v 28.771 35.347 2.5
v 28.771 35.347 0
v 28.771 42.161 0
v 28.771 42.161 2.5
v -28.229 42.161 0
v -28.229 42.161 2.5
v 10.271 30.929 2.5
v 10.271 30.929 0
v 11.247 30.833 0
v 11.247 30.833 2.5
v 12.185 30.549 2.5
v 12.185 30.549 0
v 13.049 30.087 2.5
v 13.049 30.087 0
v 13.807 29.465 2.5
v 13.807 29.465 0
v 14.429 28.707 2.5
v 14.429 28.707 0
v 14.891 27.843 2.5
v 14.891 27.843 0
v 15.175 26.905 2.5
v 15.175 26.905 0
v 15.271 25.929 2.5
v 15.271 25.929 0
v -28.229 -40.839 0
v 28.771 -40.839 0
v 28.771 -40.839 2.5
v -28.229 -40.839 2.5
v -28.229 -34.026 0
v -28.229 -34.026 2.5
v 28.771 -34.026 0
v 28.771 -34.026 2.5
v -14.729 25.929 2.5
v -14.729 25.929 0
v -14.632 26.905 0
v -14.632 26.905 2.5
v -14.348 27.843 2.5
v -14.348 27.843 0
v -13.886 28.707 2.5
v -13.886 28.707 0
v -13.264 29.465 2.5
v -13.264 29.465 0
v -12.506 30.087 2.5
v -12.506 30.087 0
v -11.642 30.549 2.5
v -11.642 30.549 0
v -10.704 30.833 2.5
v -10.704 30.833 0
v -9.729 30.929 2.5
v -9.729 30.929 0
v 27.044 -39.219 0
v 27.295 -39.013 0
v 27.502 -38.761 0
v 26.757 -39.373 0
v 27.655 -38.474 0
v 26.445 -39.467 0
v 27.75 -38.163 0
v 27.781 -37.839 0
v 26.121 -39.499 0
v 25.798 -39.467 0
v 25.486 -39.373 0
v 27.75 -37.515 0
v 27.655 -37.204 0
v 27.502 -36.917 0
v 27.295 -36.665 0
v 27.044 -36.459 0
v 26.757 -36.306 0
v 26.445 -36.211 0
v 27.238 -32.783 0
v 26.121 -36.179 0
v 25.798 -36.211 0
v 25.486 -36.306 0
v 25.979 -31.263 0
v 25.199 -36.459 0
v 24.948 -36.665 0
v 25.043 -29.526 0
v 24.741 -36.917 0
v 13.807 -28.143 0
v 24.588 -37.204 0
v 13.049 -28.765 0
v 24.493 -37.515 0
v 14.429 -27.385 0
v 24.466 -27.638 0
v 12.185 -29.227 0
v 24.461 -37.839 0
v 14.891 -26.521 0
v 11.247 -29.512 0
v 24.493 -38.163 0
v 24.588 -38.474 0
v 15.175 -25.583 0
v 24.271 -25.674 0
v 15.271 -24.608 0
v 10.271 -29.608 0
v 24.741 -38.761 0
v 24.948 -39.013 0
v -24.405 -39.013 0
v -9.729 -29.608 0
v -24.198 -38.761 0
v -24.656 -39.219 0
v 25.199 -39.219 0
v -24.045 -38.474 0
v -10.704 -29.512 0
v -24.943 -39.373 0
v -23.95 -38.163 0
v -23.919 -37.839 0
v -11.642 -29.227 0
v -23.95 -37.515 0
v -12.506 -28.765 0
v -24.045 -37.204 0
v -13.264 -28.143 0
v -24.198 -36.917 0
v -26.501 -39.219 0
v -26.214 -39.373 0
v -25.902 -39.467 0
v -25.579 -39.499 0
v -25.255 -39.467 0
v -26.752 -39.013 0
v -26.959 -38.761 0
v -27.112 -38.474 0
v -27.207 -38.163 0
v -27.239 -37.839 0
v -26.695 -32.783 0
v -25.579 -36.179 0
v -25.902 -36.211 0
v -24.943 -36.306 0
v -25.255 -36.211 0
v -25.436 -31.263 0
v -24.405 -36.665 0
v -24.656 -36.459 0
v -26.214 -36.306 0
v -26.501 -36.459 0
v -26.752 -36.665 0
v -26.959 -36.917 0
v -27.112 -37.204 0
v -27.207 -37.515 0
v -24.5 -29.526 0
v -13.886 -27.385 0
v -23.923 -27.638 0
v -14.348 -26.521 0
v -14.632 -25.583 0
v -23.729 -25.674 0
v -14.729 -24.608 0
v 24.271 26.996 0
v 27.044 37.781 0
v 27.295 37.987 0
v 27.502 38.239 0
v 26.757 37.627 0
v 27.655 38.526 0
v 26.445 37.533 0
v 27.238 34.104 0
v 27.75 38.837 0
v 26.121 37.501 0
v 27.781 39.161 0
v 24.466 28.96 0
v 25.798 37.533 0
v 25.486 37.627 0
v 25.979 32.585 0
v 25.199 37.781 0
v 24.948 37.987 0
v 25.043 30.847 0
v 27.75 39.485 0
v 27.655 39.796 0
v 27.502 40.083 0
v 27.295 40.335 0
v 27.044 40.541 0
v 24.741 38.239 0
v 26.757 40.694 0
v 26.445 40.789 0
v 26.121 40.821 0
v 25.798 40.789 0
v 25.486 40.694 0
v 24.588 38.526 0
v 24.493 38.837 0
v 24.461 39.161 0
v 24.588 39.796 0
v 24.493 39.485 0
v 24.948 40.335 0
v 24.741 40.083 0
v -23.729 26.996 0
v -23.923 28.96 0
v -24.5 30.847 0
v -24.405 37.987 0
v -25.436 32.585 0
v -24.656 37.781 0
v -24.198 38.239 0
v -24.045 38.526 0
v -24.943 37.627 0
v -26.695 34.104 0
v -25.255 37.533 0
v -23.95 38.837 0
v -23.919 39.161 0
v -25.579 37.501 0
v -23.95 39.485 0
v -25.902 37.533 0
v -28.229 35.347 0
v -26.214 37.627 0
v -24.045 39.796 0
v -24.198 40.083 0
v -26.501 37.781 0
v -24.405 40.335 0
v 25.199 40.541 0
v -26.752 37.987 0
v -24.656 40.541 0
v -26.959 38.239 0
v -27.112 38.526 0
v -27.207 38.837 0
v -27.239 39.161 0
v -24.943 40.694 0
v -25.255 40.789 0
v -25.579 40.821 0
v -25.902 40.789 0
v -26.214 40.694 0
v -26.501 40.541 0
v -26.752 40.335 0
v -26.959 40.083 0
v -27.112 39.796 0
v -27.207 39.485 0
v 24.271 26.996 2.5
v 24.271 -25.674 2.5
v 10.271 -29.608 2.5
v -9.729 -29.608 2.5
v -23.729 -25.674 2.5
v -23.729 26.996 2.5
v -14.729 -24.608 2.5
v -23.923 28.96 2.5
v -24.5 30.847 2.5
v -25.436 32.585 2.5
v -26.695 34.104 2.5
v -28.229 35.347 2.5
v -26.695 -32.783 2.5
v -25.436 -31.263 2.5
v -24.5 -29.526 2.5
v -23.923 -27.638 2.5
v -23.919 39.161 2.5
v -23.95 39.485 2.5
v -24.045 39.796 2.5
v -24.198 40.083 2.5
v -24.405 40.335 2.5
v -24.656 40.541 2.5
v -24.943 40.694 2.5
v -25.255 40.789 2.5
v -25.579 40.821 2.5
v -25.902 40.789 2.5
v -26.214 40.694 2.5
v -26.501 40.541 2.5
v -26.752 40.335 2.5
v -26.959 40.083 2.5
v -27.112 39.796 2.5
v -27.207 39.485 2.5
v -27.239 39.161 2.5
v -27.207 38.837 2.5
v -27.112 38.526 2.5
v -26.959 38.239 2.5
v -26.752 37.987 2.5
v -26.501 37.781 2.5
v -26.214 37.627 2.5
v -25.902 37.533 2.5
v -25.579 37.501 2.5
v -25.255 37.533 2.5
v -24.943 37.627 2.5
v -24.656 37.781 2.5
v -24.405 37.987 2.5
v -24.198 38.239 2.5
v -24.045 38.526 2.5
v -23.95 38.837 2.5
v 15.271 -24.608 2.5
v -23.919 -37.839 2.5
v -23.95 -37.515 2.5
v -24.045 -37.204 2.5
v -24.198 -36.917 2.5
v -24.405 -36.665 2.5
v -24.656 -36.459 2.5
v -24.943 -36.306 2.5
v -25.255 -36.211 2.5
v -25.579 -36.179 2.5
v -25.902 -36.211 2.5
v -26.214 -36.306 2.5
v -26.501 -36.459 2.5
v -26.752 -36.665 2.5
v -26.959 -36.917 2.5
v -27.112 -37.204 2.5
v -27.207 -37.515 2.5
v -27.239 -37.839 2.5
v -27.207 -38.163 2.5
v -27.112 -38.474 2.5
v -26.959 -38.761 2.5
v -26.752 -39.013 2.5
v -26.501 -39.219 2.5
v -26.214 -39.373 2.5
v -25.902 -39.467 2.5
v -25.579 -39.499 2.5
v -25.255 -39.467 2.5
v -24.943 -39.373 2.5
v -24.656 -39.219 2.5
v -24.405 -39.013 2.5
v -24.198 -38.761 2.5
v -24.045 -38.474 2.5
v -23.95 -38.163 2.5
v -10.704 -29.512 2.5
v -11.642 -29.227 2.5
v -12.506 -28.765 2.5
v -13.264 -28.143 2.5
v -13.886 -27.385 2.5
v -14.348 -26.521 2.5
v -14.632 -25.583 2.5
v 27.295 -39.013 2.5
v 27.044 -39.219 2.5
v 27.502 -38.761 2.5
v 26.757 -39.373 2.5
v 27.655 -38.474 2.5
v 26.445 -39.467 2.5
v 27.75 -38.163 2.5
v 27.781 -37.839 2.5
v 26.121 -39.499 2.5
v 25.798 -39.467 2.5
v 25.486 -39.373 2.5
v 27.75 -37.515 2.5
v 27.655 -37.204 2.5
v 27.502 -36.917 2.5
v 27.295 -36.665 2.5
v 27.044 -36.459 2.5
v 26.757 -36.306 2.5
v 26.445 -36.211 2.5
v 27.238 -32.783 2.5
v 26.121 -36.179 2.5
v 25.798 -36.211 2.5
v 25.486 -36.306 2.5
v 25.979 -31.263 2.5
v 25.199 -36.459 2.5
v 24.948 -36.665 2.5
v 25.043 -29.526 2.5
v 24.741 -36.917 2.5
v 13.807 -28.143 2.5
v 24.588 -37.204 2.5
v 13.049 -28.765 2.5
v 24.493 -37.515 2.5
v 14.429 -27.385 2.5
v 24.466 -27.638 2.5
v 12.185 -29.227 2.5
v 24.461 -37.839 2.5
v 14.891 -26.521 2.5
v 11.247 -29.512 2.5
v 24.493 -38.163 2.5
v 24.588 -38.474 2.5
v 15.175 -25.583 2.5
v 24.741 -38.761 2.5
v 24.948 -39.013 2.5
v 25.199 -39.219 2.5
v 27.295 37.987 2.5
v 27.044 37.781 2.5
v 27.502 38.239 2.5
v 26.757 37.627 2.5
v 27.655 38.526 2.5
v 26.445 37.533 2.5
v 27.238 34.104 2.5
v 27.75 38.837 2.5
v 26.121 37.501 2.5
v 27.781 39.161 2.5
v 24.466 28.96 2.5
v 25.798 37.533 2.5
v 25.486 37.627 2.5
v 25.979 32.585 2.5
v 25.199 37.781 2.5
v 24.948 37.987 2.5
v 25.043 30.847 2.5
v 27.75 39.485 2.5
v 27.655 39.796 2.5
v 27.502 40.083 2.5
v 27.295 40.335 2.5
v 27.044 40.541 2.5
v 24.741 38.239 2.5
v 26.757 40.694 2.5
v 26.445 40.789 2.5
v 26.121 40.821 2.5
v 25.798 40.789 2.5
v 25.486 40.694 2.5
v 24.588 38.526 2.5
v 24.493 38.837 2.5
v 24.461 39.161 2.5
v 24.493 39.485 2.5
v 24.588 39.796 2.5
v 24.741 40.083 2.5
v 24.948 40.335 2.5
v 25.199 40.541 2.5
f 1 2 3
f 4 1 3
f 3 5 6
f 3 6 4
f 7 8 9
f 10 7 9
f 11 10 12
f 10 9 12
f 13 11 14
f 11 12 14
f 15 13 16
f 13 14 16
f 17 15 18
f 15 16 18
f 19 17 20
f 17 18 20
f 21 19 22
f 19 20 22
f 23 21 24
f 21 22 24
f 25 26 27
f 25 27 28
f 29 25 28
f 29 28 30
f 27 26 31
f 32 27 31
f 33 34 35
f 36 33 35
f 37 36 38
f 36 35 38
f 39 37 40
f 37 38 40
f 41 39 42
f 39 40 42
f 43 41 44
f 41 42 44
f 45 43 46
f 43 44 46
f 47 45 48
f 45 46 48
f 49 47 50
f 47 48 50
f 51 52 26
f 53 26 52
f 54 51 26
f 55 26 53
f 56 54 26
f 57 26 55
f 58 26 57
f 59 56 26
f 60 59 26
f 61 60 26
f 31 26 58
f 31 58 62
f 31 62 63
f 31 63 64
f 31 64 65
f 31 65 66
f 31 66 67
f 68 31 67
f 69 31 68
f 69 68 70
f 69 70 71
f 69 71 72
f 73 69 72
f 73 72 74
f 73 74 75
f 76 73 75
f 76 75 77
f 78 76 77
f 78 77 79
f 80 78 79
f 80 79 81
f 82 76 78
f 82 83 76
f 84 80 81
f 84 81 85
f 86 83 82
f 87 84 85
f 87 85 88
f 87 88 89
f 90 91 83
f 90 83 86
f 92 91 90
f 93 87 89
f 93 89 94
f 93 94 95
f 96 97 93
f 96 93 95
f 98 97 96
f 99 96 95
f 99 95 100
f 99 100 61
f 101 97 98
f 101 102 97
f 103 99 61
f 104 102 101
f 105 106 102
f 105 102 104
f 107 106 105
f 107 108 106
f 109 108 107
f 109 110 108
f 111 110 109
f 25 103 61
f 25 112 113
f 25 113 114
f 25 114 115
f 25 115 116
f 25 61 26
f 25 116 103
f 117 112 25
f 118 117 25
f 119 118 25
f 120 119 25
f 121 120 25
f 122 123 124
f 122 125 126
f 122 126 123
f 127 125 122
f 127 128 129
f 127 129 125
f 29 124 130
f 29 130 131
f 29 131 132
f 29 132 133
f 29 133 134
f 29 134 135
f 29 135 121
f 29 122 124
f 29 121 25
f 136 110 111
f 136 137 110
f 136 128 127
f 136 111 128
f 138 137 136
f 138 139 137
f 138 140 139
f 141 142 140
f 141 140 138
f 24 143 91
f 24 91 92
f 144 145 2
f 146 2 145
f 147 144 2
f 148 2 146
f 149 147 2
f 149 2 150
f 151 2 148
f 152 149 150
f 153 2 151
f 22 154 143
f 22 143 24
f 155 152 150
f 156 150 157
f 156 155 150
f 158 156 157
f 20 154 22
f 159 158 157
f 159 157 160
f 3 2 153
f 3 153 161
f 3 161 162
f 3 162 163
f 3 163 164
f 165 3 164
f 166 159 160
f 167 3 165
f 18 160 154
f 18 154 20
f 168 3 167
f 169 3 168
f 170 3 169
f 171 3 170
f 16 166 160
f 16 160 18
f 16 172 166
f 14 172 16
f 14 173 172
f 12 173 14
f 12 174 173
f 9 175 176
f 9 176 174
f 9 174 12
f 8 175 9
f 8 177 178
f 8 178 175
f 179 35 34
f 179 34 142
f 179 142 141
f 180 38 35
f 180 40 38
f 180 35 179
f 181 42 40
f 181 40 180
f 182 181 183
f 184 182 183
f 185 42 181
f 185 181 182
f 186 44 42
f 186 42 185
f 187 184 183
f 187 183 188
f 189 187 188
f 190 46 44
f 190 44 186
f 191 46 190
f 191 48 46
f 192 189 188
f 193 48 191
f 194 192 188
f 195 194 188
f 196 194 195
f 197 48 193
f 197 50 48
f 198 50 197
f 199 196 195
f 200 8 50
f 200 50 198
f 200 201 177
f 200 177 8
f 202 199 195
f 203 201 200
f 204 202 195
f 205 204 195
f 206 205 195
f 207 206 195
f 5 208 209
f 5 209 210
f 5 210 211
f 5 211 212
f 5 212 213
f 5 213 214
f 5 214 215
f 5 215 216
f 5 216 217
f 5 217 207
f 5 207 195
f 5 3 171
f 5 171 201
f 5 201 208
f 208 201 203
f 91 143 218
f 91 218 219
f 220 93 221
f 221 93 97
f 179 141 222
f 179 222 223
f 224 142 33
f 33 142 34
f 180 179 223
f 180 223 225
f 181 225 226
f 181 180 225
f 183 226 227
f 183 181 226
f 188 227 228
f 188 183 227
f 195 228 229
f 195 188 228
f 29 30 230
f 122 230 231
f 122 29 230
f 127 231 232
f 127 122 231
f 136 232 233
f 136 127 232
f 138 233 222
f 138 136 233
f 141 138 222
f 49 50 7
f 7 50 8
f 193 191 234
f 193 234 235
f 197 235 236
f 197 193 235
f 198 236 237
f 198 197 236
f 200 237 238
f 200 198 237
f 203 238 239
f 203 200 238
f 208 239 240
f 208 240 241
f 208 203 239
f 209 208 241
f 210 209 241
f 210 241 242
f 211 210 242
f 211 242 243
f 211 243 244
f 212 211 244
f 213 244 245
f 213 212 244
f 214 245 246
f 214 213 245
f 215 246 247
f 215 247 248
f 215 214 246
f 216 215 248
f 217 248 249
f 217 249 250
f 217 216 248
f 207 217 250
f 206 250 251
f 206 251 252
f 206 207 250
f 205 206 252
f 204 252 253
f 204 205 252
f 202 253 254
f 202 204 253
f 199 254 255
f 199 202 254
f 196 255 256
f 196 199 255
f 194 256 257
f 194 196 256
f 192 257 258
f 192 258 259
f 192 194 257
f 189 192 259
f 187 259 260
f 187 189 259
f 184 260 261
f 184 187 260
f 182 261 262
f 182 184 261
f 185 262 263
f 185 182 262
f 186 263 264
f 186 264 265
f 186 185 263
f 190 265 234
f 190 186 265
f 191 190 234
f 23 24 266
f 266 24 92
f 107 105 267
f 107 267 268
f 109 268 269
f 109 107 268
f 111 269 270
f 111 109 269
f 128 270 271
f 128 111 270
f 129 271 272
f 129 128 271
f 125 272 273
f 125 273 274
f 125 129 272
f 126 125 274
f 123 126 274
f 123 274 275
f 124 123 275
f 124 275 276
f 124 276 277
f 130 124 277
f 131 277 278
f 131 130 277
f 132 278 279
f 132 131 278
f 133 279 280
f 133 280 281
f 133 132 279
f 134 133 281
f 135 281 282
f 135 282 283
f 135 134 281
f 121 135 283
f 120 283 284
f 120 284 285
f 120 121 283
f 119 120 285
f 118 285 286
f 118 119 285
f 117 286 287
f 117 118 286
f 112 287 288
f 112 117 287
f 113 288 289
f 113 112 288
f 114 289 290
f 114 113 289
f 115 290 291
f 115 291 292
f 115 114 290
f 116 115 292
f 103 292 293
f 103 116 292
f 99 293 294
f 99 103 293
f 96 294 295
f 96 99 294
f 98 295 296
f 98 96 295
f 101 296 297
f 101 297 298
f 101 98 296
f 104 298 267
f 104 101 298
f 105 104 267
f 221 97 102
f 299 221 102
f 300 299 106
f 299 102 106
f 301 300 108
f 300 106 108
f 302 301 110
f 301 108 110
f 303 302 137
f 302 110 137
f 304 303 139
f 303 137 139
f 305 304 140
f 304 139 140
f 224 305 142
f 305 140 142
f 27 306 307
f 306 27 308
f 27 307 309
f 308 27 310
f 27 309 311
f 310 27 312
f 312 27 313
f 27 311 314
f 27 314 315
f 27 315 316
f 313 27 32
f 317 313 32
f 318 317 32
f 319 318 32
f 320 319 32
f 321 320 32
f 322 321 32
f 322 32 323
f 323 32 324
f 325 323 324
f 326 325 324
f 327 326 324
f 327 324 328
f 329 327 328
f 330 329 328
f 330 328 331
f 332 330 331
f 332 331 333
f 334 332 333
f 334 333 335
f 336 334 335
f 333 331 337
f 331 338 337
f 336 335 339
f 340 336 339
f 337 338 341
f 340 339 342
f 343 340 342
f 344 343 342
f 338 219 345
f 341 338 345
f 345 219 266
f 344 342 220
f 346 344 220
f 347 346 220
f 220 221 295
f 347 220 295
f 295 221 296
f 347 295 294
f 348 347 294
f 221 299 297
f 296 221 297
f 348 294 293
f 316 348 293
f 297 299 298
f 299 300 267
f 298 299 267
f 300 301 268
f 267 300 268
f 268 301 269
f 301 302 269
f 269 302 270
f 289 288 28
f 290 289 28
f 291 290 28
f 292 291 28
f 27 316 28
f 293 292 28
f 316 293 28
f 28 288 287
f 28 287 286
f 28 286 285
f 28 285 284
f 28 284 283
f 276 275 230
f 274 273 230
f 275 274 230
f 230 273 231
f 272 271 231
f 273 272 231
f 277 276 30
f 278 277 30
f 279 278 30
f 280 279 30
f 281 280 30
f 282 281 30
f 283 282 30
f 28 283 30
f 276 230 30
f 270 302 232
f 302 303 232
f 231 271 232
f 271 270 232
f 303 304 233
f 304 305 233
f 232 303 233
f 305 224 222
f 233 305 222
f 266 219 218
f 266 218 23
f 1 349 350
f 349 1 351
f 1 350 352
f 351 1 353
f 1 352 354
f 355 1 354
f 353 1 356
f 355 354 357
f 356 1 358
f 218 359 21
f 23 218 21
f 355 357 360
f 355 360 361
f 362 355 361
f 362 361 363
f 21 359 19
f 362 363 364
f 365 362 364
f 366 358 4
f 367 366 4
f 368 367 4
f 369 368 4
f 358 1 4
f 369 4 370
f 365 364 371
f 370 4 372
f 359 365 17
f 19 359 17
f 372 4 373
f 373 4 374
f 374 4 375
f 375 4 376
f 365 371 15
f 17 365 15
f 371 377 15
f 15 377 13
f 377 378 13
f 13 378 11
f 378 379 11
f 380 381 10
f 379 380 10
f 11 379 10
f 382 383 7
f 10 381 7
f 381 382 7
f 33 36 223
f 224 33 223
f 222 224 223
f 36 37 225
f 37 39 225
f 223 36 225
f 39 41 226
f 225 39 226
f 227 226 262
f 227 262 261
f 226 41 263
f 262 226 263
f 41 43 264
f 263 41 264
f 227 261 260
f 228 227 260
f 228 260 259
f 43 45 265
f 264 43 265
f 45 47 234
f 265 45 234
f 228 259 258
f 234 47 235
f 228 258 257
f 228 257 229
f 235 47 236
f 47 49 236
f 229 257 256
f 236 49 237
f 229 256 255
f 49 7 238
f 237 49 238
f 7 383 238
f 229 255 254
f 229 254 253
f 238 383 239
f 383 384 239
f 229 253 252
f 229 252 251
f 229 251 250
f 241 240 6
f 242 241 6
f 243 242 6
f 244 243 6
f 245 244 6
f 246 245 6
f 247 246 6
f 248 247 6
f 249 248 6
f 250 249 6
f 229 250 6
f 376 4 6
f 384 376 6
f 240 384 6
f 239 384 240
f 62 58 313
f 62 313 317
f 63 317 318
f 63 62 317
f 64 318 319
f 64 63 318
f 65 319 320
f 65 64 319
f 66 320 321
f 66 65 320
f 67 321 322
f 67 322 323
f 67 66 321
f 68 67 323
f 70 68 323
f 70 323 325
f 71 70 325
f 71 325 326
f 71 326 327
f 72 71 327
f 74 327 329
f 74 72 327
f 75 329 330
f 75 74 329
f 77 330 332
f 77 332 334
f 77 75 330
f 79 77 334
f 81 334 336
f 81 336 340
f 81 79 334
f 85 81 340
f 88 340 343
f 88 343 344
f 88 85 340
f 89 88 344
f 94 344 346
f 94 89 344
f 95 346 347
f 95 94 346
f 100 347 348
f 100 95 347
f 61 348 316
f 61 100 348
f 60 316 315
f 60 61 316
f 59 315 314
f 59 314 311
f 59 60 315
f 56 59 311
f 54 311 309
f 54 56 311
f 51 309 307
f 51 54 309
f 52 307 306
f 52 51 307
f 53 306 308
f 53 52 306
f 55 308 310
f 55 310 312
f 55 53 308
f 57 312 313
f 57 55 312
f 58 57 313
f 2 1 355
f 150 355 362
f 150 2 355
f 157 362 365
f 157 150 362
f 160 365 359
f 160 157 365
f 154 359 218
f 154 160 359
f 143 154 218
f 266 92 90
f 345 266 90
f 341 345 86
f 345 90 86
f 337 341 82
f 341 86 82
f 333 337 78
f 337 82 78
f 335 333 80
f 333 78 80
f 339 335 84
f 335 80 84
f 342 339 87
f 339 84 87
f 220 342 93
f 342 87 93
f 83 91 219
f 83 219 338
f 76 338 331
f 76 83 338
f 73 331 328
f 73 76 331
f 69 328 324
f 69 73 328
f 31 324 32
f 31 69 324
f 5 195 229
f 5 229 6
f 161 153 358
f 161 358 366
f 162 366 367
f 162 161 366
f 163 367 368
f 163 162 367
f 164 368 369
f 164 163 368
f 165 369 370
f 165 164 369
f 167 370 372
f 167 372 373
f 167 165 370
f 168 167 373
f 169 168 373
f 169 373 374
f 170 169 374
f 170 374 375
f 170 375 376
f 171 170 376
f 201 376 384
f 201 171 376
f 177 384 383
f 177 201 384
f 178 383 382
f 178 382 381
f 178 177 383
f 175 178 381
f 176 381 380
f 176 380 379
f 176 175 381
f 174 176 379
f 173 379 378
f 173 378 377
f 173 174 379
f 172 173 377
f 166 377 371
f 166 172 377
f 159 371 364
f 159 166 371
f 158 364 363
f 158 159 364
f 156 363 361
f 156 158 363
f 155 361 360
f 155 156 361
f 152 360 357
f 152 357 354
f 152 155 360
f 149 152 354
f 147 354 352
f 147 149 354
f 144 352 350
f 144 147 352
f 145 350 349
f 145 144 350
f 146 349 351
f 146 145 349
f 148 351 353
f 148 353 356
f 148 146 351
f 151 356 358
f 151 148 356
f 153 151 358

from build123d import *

# Parameters (mm, degrees)
ESQUISSE1_R             = 1.66
BOSS_EXTRU_1_DEPTH      = 2.5
ESQUISSE2_W             = 13.135596865
ESQUISSE2_H             = 97.305440857
ENL_V_MAT_EXTRU_1_DEPTH = 3.5


with BuildPart() as part:
    # Esquisse1 → Boss.-Extru.1 (new body)
    with BuildSketch(Plane.XY):
        with BuildLine():
            Line((-29.728572008, 42.160761401), (-21.428572008, 42.160761401))
            Line((-21.428572008, 42.160761401), (21.971427992, 42.160761401))
            Line((21.971427992, 42.160761401), (30.271427992, 42.160761401))
            Line((30.271427992, 42.160761401), (30.271427992, 36.160761401))
            ThreePointArc((30.271427992, 36.160761401), (25.904827727, 32.472835586), (24.271427992, 26.995610011))
            Line((24.271427992, 26.995610011), (24.271427992, -25.67408721))
            ThreePointArc((24.271427992, -25.67408721), (25.904827727, -31.151312785), (30.271427992, -34.839238599))
            Line((30.271427992, -34.839238599), (30.271427992, -40.839238599))
            Line((30.271427992, -40.839238599), (21.971427992, -40.839238599))
            Line((21.971427992, -40.839238599), (-21.428572008, -40.839238599))
            Line((-21.428572008, -40.839238599), (-29.728572008, -40.839238599))
            Line((-29.728572008, -40.839238599), (-29.728572008, -34.839238599))
            ThreePointArc((-29.728572008, -34.839238599), (-25.361971742, -31.151312785), (-23.728572008, -25.67408721))
            Line((-23.728572008, -25.67408721), (-23.728572008, 26.995610011))
            ThreePointArc((-23.728572008, 26.995610011), (-25.361971742, 32.472835586), (-29.728572008, 36.160761401))
            Line((-29.728572008, 36.160761401), (-29.728572008, 42.160761401))
        make_face()
        with Locations((-25.578572008, 39.160761401)):
            Circle(ESQUISSE1_R, mode=Mode.SUBTRACT)
        with Locations((26.121427992, 39.160761401)):
            Circle(ESQUISSE1_R, mode=Mode.SUBTRACT)
        with Locations((-25.578572008, -37.839238599)):
            Circle(ESQUISSE1_R, mode=Mode.SUBTRACT)
        with Locations((26.121427992, -37.839238599)):
            Circle(ESQUISSE1_R, mode=Mode.SUBTRACT)
        with BuildLine():
            Line((-9.728572008, 30.929161254), (10.271427992, 30.929161254))
            ThreePointArc((10.271427992, 30.929161254), (13.806961898, 29.46469516), (15.271427992, 25.929161254))
            Line((15.271427992, 25.929161254), (15.271427992, -24.607638453))
            ThreePointArc((15.271427992, -24.607638453), (13.806961898, -28.143172359), (10.271427992, -29.607638453))
            Line((10.271427992, -29.607638453), (-9.728572008, -29.607638453))
            ThreePointArc((-9.728572008, -29.607638453), (-13.264105914, -28.143172359), (-14.728572008, -24.607638453))
            Line((-14.728572008, -24.607638453), (-14.728572008, 25.929161254))
            ThreePointArc((-14.728572008, 25.929161254), (-13.264105914, 29.46469516), (-9.728572008, 30.929161254))
        make_face(mode=Mode.SUBTRACT)
    extrude(amount=BOSS_EXTRU_1_DEPTH)

    # Esquisse2 → Enlèv. mat.-Extru.1 (cut, through all)
    with BuildSketch(Plane(origin=(0, 0, 0), x_dir=(-1, 0, 0), z_dir=(0, 0, -1))):
        with Locations((-35.339226425, 0.262800476)):
            Rectangle(ESQUISSE2_W, ESQUISSE2_H)
        with Locations((34.79637044, 0.262800476)):
            Rectangle(ESQUISSE2_W, ESQUISSE2_H)
    extrude(amount=-ENL_V_MAT_EXTRU_1_DEPTH, mode=Mode.SUBTRACT)


solid = part.part
